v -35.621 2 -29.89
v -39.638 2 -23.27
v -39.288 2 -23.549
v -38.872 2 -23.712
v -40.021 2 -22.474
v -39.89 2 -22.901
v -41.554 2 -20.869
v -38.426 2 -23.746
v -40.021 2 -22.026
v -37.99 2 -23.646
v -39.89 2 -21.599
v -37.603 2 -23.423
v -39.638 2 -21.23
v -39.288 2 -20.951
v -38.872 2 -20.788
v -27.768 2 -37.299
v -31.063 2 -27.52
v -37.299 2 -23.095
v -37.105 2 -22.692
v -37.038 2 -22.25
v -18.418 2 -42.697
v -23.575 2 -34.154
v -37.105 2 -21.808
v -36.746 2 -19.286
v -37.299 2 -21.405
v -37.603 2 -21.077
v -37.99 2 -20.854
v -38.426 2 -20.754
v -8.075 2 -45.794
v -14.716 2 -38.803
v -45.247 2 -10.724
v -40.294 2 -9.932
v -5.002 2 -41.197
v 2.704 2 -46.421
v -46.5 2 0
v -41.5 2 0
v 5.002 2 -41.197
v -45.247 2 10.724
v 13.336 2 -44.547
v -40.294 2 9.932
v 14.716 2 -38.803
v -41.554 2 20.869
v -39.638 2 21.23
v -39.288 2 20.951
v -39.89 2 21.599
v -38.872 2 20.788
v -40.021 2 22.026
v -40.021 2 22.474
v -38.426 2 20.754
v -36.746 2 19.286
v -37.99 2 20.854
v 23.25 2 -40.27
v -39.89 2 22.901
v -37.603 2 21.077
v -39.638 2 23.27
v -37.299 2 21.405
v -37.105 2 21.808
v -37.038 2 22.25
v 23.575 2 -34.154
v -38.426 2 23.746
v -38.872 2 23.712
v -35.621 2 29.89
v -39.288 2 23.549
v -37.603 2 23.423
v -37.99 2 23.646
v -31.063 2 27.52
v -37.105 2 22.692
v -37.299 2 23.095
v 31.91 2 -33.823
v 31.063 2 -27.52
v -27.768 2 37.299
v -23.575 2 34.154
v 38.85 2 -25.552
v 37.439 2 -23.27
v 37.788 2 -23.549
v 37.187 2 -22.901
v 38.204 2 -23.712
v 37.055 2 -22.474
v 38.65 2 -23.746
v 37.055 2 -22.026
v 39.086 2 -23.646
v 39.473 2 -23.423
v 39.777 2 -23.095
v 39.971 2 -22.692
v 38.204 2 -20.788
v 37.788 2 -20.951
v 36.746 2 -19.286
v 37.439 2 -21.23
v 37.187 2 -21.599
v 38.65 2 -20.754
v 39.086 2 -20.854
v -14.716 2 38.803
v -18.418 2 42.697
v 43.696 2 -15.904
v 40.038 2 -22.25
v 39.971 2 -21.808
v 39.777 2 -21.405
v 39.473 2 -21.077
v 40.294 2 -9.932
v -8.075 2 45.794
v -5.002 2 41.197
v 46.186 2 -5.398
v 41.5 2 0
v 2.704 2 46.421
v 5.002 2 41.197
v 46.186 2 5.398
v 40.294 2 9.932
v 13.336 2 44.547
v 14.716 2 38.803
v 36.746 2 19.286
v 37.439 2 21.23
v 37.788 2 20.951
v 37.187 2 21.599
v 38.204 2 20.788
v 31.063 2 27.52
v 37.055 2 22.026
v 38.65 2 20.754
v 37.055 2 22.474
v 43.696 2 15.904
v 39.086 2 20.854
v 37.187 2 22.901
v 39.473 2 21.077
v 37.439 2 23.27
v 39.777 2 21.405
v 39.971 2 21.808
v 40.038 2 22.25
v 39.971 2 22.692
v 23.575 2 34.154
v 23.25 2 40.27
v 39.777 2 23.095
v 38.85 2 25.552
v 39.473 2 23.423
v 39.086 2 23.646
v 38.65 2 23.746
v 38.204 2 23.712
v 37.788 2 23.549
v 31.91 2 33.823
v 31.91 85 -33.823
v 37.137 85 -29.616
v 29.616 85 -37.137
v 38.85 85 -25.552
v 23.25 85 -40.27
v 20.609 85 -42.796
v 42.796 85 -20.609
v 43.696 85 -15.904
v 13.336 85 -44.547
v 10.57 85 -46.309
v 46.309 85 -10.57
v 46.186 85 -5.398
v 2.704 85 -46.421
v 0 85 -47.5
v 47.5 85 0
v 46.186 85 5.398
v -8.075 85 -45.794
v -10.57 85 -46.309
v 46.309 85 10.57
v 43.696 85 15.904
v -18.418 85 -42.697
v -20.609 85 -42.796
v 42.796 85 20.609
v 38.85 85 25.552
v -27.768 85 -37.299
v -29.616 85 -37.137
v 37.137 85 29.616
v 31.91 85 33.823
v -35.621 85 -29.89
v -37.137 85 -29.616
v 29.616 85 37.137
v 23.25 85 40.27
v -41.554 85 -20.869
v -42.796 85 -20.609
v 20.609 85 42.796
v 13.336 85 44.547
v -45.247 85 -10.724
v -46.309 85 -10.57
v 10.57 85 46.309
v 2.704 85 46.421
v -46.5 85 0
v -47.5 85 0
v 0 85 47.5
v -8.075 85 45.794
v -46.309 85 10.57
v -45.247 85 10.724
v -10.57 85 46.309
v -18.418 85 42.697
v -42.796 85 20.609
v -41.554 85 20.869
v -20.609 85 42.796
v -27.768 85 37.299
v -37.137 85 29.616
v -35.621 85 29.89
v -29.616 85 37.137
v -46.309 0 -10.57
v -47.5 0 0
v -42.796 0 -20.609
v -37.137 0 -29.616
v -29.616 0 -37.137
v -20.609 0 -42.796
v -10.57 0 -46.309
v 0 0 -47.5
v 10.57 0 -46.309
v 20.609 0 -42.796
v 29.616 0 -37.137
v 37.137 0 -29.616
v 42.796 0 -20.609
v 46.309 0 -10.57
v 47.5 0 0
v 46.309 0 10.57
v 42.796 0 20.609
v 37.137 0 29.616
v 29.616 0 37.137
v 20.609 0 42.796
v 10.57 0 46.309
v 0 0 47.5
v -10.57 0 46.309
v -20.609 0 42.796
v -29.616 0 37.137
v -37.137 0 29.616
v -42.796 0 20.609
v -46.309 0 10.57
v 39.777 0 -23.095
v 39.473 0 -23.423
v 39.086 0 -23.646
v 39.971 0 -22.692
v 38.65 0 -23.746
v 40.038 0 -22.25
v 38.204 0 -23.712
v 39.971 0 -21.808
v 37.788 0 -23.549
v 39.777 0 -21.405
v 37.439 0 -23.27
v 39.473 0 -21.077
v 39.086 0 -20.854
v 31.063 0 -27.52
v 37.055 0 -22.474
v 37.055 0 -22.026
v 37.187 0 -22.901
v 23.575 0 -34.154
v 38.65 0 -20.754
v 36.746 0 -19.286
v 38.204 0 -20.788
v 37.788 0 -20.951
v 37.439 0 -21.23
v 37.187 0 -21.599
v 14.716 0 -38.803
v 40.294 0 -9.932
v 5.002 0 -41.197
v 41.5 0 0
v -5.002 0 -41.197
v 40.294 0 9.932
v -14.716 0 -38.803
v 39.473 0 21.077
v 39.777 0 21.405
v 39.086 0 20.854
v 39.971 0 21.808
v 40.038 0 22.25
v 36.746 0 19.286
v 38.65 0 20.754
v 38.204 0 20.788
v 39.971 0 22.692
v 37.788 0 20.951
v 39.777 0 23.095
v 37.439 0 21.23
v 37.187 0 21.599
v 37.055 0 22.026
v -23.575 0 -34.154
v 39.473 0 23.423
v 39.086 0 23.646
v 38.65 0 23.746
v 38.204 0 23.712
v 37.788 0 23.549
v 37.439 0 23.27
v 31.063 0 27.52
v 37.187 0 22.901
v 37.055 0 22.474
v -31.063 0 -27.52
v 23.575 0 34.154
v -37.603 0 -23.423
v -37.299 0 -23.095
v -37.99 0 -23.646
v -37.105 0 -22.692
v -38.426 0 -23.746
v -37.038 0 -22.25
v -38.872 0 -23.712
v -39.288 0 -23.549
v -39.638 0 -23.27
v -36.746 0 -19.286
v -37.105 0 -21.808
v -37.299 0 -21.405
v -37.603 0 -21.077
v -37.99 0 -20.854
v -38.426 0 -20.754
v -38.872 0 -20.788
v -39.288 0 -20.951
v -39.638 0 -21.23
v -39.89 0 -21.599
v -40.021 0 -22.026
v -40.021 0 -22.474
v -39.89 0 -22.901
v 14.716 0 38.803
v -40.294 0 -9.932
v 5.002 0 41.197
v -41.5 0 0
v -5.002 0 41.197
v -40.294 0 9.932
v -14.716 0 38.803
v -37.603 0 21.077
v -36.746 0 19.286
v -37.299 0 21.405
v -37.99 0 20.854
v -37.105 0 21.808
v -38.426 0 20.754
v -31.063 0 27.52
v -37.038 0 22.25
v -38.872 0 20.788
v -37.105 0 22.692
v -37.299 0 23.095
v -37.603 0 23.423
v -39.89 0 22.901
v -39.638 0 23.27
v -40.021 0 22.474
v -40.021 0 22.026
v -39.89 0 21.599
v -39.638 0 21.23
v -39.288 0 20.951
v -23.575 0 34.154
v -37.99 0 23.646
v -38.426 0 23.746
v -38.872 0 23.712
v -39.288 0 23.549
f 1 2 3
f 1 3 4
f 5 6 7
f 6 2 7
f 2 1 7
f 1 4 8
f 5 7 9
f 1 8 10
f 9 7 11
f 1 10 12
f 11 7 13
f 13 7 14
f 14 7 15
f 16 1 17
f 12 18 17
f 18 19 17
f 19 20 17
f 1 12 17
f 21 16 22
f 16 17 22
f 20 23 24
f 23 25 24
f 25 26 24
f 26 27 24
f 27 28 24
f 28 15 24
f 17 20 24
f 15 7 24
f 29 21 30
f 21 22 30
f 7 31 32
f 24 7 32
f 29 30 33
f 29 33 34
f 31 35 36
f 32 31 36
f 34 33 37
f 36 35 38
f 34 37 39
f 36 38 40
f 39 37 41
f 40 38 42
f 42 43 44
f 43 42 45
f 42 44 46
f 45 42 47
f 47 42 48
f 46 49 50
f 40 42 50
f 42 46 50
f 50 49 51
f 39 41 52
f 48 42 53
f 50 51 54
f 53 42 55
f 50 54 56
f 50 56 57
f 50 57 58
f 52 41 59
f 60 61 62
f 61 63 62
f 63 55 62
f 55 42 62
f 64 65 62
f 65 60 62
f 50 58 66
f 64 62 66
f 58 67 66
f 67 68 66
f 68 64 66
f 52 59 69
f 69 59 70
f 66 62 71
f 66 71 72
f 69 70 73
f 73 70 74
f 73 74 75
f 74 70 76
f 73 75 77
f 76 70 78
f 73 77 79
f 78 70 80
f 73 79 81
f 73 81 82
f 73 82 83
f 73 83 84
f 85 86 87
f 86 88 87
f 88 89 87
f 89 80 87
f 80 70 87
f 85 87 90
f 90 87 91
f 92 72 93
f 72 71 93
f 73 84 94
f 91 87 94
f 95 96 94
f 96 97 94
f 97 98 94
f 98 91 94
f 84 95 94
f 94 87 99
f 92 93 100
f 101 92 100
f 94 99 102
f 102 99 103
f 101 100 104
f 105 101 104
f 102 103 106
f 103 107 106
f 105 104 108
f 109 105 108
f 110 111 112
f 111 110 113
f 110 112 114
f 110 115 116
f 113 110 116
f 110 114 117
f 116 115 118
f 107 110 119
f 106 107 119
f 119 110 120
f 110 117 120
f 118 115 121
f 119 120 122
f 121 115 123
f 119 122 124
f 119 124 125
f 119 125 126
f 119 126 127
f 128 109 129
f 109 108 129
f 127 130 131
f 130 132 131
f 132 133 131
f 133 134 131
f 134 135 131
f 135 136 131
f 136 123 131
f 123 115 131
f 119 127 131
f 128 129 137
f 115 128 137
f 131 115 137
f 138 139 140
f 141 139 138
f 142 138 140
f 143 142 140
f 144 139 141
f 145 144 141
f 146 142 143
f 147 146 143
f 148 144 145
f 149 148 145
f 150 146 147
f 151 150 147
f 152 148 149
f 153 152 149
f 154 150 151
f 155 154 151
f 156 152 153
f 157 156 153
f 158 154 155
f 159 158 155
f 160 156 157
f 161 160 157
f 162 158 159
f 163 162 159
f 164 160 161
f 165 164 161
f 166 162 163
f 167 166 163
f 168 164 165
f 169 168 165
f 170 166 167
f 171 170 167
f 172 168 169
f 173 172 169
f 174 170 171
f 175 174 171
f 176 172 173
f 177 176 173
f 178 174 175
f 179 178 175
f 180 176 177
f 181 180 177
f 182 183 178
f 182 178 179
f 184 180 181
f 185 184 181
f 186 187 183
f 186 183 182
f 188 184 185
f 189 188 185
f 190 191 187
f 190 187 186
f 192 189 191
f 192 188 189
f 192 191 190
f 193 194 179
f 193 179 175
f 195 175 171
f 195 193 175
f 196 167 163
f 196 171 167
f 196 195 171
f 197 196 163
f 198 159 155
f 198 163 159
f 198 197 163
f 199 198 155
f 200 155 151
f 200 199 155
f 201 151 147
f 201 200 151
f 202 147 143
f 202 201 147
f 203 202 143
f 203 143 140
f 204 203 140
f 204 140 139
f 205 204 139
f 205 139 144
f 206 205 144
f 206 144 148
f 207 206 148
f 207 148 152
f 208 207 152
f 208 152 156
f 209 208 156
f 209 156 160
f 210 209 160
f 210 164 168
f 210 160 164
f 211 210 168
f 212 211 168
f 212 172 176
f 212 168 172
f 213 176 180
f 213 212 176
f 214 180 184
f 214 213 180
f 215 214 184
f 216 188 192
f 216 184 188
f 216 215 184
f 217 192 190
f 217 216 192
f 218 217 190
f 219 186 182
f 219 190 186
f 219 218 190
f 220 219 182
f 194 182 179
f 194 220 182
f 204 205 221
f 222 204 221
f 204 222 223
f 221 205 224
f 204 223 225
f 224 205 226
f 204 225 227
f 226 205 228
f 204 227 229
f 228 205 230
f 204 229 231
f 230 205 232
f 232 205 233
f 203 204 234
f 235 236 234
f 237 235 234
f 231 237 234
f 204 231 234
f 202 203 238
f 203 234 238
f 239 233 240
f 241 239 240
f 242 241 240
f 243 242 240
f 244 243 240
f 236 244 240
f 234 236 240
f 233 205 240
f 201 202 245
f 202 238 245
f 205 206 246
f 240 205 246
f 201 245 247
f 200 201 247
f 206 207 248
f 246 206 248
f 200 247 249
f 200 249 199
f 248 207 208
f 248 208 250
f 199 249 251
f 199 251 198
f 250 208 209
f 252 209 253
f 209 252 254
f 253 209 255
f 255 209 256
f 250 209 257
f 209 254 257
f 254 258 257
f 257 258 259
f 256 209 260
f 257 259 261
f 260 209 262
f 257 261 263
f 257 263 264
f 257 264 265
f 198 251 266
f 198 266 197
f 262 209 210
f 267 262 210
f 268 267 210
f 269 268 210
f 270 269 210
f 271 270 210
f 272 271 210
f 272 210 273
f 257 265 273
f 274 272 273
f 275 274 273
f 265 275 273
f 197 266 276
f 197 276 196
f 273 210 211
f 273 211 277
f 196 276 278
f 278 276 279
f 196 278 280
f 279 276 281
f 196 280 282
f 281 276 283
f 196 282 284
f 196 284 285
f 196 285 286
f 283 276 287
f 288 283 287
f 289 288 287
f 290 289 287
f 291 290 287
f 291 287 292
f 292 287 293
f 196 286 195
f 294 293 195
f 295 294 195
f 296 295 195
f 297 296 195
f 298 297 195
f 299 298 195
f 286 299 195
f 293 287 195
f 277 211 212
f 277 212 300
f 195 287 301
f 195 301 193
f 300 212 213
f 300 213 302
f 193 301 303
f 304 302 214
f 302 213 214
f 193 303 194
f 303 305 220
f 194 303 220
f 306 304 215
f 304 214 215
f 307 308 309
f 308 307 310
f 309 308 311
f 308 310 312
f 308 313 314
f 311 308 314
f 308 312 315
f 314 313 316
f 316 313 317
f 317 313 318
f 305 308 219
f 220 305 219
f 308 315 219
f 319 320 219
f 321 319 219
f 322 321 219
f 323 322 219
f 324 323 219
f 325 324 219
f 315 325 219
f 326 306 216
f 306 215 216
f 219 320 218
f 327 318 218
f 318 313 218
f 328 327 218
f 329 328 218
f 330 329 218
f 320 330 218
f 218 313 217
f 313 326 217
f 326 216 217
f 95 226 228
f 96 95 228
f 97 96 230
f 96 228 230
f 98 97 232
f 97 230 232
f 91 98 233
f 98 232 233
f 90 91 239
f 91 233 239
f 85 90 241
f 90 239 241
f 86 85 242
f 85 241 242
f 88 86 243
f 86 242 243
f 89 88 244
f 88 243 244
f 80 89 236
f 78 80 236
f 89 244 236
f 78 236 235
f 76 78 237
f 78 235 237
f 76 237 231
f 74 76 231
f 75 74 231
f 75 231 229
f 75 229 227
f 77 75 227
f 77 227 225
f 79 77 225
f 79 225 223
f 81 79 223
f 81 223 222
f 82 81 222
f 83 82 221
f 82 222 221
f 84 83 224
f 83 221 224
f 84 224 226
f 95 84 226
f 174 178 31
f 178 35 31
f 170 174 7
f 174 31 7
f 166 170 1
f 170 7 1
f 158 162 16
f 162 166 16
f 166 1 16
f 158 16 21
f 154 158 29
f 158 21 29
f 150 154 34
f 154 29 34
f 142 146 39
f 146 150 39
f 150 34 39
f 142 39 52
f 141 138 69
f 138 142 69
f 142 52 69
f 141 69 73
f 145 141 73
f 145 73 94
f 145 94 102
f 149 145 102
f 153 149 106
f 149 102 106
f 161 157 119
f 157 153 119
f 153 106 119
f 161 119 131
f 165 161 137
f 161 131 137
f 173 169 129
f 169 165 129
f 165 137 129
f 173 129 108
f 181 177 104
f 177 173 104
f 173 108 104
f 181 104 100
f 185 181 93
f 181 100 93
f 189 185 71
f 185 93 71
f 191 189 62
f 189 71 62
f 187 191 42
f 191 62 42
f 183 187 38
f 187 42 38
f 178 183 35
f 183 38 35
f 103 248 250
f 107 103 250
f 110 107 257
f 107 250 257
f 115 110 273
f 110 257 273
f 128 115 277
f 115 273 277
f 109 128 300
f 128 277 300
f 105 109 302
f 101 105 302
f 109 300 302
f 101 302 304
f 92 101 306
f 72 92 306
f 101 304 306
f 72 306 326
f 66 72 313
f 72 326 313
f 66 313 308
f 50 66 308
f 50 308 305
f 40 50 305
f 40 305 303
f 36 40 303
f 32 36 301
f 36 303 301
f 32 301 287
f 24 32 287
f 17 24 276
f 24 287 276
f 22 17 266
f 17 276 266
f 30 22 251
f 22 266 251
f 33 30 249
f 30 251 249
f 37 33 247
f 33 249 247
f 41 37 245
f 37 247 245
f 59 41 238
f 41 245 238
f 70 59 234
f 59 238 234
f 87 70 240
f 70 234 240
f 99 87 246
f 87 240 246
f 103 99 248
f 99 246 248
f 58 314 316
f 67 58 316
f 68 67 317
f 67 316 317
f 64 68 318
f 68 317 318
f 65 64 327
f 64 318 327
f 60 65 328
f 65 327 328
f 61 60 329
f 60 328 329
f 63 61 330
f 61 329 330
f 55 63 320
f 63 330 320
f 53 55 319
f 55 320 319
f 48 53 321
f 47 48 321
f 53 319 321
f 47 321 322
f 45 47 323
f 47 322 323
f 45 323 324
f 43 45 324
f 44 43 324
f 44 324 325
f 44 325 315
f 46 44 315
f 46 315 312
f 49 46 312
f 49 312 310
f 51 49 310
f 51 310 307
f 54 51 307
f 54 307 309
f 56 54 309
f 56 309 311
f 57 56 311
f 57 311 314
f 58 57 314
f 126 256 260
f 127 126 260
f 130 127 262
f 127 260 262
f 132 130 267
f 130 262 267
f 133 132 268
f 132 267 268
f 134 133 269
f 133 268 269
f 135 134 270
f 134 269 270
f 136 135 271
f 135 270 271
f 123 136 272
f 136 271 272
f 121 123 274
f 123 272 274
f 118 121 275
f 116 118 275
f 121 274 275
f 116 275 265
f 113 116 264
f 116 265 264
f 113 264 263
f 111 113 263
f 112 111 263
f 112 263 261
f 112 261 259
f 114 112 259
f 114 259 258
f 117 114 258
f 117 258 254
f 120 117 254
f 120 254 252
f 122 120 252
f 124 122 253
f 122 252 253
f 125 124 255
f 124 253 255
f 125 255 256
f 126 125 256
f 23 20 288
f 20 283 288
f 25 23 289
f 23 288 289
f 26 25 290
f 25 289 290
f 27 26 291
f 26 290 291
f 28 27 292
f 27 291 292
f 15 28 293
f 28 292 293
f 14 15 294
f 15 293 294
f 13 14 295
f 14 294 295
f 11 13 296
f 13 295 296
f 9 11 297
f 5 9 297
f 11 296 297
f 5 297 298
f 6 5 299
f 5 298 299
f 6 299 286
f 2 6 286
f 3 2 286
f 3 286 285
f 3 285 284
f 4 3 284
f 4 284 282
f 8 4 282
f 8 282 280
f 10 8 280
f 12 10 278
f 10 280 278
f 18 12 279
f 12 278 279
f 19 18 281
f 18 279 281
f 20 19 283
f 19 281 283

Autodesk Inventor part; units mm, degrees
ref_plane "YZ Plane" through (0, 0, 0) normal (1, 0, 0) x (0, 1, 0)
ref_plane "XZ Plane" through (0, 0, 0) normal (0, 1, 0) x (-1, 0, 0)
ref_plane "XY Plane" through (0, 0, 0) normal (0, 0, 1) x (1, 0, 0)
sketch "Sketch1" plane through (0, 0, 0) normal (0, 1, 0) x (-1, 0, 0)
  circle A0 centre (0, 0) radius 46.5
  circle A1 centre (0, 0) radius 47.5
  dimension "d0" = 93
  dimension "d1" = 95
extrude "Extrusion1" add sketch "Sketch1" along normal blind 85
sketch "Sketch2" plane through (0, 0, 0) normal (0, -1, 0) x (1, 0, 0)
  circle A0 centre (0, 0) radius 41.5
  circle A1 centre (0, 0) radius 47.5 projected
  dimension "d4" = 83
extrude "Extrusion2" add sketch "Sketch2" against normal blind 2
sketch "Sketch3" plane through (0, 0, 0) normal (0, -1, 0) x (1, 0, 0)
  circle A0 centre (0, 44.5) radius 1.5
  circle A1 centre (-38.5381, 22.25) radius 1.5
  circle A2 centre (-38.5381, -22.25) radius 1.5
  circle A3 centre (0, -44.5) radius 1.5
  circle A4 centre (38.5381, -22.25) radius 1.5
  circle A5 centre (38.5381, 22.25) radius 1.5
  point P0 (0, 0)
  dimension "d7" = 3
  dimension "d8" = 44.5
  dimension "d11" = 360
extrude "Extrusion3" cut sketch "Sketch3" against normal blind 10 contours A1 | A2 | A4 | A5
properties part number "Outer casing"
